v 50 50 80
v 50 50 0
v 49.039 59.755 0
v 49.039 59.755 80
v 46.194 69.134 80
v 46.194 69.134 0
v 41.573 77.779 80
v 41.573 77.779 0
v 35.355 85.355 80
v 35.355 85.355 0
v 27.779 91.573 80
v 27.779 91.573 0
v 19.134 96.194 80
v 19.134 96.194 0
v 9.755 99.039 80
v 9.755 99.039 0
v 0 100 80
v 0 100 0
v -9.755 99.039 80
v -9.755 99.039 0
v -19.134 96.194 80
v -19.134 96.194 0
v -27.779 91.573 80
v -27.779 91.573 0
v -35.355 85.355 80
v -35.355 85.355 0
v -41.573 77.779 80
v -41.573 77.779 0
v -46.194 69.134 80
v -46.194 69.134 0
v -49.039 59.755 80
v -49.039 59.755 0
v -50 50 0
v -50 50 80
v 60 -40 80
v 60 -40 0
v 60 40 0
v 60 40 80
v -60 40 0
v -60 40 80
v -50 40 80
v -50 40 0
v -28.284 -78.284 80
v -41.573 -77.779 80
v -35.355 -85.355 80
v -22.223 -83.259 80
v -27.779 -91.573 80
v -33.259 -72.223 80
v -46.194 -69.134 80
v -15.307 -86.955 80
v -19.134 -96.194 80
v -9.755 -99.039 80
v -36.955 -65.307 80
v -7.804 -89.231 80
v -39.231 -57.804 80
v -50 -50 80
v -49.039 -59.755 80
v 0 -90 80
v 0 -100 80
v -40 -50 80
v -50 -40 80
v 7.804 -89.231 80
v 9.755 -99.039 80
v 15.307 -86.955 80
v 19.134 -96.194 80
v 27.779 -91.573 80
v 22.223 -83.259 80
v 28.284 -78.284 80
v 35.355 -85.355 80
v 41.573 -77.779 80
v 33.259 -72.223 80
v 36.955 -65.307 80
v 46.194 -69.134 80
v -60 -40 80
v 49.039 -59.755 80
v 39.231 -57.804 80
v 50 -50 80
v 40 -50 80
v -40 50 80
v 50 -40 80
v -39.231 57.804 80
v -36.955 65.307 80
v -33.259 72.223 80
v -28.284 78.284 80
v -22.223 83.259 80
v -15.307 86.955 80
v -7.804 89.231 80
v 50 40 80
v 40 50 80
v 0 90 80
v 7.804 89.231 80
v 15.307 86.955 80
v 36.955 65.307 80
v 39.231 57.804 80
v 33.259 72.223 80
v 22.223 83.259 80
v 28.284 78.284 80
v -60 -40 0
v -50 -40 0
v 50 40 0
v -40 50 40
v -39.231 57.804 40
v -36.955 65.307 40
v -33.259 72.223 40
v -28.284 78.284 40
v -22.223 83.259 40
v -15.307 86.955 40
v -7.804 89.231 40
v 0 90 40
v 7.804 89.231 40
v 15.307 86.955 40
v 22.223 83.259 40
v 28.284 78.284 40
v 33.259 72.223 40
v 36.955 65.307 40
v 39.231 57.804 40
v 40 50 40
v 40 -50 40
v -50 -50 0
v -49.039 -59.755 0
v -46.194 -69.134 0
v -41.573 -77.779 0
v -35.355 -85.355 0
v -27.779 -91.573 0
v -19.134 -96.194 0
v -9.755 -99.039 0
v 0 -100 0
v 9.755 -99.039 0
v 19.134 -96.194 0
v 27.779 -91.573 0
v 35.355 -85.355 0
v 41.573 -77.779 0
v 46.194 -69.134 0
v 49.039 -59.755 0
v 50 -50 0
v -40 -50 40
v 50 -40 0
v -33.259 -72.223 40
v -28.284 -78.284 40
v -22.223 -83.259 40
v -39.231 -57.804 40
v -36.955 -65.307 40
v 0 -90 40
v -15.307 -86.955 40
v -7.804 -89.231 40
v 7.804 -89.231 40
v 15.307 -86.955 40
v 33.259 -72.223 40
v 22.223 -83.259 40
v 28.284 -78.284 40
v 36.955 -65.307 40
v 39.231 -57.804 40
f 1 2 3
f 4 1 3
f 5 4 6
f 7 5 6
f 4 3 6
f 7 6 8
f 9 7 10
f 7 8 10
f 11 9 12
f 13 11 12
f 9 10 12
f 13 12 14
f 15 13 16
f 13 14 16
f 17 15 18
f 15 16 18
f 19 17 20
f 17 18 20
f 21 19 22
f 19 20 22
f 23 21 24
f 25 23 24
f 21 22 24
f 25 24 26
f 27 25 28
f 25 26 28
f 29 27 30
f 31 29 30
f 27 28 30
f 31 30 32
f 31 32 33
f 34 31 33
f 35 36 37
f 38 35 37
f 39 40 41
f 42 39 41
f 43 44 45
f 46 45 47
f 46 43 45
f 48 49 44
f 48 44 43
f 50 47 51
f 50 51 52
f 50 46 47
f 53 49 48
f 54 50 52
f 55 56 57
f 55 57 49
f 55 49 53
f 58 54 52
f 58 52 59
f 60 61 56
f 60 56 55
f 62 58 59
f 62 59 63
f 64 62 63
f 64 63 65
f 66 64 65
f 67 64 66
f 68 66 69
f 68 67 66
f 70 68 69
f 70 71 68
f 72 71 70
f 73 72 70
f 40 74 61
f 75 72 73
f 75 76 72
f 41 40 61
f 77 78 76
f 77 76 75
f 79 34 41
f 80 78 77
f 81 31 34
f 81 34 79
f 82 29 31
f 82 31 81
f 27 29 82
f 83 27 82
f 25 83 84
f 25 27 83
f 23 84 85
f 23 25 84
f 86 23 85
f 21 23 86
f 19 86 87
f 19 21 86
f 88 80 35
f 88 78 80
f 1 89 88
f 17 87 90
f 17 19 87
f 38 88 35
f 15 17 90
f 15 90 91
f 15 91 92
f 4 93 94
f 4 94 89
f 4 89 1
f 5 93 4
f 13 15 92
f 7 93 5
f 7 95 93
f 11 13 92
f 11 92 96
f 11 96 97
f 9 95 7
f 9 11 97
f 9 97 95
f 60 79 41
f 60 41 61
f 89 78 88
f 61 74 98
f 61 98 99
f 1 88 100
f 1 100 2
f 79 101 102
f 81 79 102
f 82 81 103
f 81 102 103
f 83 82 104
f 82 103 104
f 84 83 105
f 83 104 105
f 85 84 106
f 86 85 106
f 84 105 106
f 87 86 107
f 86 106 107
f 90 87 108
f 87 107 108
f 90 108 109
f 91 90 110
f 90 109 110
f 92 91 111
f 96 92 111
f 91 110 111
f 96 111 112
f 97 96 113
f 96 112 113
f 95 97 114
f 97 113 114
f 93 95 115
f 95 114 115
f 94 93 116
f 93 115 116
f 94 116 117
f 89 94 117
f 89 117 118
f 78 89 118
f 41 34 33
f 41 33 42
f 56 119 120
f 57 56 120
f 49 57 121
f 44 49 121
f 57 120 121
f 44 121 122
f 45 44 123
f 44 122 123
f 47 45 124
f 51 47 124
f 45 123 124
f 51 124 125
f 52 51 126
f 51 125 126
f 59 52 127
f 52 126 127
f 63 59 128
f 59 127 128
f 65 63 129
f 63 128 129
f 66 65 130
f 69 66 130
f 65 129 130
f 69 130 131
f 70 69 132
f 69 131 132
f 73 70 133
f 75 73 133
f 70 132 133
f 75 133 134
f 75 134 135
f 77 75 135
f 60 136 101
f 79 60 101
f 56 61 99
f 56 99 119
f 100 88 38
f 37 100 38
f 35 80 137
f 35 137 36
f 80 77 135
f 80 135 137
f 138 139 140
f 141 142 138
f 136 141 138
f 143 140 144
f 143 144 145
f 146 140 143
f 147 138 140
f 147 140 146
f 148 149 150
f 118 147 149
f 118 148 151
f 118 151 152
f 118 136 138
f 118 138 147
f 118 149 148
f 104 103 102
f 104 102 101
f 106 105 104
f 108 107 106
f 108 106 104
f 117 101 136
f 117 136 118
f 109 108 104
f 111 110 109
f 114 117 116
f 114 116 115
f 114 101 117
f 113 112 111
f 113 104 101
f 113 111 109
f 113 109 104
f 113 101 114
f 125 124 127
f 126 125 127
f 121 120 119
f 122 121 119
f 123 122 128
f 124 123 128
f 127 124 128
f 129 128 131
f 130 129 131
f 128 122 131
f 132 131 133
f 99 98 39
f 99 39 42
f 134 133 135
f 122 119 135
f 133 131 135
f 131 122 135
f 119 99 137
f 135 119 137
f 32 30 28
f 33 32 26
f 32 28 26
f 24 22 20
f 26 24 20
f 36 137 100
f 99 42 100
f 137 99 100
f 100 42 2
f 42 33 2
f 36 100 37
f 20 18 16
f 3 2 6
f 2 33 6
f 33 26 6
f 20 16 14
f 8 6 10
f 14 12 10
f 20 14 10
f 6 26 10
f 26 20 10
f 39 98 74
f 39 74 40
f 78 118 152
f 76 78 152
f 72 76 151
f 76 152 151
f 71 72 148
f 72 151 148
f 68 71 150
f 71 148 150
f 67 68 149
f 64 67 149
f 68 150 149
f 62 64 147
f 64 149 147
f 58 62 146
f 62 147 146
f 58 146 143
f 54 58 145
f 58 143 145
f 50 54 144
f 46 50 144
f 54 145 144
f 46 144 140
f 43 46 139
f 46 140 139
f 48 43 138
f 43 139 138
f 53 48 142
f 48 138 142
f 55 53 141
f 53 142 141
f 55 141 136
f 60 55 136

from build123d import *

# Parameters (mm, degrees)
F1_DEPTH = 80
F2_DEPTH = 40
F0_W     = 10
F0_H     = 80
F3_DEPTH = 80


with BuildPart() as f1:
    # F0 (on Top) → F1 (new body)
    with BuildSketch(Plane.XY):
        with BuildLine():
            ThreePointArc((50, 50), (0, 100), (-50, 50))
            Line((-50, 50), (-50, 40))
            Line((-50, 40), (-50, -40))
            Line((-50, -40), (-50, -50))
            ThreePointArc((-50, -50), (0, -100), (50, -50))
            Line((50, -50), (50, -40))
            Line((50, -40), (50, 40))
            Line((50, 40), (50, 50))
        make_face()
        with BuildLine():
            Line((-40, -50), (-40, 50))
            ThreePointArc((-40, 50), (0, 90), (40, 50))
            Line((40, 50), (40, -50))
            ThreePointArc((40, -50), (0, -90), (-40, -50))
        make_face(mode=Mode.SUBTRACT)
    extrude(amount=F1_DEPTH)

    # F0 (on Top) → F2 (join)
    with BuildSketch(Plane.XY):
        with BuildLine():
            ThreePointArc((40, 50), (0, 90), (-40, 50))
            Line((-40, 50), (-40, -50))
            ThreePointArc((-40, -50), (0, -90), (40, -50))
            Line((40, -50), (40, 50))
        make_face()
    extrude(amount=F2_DEPTH)

    # F0 (on Top) → F3 (join)
    with BuildSketch(Plane.XY):
        with Locations((55, 0)):
            Rectangle(F0_W, F0_H)
        with Locations((-55, 0)):
            Rectangle(F0_W, F0_H)
    extrude(amount=F3_DEPTH)


solid = f1.part
